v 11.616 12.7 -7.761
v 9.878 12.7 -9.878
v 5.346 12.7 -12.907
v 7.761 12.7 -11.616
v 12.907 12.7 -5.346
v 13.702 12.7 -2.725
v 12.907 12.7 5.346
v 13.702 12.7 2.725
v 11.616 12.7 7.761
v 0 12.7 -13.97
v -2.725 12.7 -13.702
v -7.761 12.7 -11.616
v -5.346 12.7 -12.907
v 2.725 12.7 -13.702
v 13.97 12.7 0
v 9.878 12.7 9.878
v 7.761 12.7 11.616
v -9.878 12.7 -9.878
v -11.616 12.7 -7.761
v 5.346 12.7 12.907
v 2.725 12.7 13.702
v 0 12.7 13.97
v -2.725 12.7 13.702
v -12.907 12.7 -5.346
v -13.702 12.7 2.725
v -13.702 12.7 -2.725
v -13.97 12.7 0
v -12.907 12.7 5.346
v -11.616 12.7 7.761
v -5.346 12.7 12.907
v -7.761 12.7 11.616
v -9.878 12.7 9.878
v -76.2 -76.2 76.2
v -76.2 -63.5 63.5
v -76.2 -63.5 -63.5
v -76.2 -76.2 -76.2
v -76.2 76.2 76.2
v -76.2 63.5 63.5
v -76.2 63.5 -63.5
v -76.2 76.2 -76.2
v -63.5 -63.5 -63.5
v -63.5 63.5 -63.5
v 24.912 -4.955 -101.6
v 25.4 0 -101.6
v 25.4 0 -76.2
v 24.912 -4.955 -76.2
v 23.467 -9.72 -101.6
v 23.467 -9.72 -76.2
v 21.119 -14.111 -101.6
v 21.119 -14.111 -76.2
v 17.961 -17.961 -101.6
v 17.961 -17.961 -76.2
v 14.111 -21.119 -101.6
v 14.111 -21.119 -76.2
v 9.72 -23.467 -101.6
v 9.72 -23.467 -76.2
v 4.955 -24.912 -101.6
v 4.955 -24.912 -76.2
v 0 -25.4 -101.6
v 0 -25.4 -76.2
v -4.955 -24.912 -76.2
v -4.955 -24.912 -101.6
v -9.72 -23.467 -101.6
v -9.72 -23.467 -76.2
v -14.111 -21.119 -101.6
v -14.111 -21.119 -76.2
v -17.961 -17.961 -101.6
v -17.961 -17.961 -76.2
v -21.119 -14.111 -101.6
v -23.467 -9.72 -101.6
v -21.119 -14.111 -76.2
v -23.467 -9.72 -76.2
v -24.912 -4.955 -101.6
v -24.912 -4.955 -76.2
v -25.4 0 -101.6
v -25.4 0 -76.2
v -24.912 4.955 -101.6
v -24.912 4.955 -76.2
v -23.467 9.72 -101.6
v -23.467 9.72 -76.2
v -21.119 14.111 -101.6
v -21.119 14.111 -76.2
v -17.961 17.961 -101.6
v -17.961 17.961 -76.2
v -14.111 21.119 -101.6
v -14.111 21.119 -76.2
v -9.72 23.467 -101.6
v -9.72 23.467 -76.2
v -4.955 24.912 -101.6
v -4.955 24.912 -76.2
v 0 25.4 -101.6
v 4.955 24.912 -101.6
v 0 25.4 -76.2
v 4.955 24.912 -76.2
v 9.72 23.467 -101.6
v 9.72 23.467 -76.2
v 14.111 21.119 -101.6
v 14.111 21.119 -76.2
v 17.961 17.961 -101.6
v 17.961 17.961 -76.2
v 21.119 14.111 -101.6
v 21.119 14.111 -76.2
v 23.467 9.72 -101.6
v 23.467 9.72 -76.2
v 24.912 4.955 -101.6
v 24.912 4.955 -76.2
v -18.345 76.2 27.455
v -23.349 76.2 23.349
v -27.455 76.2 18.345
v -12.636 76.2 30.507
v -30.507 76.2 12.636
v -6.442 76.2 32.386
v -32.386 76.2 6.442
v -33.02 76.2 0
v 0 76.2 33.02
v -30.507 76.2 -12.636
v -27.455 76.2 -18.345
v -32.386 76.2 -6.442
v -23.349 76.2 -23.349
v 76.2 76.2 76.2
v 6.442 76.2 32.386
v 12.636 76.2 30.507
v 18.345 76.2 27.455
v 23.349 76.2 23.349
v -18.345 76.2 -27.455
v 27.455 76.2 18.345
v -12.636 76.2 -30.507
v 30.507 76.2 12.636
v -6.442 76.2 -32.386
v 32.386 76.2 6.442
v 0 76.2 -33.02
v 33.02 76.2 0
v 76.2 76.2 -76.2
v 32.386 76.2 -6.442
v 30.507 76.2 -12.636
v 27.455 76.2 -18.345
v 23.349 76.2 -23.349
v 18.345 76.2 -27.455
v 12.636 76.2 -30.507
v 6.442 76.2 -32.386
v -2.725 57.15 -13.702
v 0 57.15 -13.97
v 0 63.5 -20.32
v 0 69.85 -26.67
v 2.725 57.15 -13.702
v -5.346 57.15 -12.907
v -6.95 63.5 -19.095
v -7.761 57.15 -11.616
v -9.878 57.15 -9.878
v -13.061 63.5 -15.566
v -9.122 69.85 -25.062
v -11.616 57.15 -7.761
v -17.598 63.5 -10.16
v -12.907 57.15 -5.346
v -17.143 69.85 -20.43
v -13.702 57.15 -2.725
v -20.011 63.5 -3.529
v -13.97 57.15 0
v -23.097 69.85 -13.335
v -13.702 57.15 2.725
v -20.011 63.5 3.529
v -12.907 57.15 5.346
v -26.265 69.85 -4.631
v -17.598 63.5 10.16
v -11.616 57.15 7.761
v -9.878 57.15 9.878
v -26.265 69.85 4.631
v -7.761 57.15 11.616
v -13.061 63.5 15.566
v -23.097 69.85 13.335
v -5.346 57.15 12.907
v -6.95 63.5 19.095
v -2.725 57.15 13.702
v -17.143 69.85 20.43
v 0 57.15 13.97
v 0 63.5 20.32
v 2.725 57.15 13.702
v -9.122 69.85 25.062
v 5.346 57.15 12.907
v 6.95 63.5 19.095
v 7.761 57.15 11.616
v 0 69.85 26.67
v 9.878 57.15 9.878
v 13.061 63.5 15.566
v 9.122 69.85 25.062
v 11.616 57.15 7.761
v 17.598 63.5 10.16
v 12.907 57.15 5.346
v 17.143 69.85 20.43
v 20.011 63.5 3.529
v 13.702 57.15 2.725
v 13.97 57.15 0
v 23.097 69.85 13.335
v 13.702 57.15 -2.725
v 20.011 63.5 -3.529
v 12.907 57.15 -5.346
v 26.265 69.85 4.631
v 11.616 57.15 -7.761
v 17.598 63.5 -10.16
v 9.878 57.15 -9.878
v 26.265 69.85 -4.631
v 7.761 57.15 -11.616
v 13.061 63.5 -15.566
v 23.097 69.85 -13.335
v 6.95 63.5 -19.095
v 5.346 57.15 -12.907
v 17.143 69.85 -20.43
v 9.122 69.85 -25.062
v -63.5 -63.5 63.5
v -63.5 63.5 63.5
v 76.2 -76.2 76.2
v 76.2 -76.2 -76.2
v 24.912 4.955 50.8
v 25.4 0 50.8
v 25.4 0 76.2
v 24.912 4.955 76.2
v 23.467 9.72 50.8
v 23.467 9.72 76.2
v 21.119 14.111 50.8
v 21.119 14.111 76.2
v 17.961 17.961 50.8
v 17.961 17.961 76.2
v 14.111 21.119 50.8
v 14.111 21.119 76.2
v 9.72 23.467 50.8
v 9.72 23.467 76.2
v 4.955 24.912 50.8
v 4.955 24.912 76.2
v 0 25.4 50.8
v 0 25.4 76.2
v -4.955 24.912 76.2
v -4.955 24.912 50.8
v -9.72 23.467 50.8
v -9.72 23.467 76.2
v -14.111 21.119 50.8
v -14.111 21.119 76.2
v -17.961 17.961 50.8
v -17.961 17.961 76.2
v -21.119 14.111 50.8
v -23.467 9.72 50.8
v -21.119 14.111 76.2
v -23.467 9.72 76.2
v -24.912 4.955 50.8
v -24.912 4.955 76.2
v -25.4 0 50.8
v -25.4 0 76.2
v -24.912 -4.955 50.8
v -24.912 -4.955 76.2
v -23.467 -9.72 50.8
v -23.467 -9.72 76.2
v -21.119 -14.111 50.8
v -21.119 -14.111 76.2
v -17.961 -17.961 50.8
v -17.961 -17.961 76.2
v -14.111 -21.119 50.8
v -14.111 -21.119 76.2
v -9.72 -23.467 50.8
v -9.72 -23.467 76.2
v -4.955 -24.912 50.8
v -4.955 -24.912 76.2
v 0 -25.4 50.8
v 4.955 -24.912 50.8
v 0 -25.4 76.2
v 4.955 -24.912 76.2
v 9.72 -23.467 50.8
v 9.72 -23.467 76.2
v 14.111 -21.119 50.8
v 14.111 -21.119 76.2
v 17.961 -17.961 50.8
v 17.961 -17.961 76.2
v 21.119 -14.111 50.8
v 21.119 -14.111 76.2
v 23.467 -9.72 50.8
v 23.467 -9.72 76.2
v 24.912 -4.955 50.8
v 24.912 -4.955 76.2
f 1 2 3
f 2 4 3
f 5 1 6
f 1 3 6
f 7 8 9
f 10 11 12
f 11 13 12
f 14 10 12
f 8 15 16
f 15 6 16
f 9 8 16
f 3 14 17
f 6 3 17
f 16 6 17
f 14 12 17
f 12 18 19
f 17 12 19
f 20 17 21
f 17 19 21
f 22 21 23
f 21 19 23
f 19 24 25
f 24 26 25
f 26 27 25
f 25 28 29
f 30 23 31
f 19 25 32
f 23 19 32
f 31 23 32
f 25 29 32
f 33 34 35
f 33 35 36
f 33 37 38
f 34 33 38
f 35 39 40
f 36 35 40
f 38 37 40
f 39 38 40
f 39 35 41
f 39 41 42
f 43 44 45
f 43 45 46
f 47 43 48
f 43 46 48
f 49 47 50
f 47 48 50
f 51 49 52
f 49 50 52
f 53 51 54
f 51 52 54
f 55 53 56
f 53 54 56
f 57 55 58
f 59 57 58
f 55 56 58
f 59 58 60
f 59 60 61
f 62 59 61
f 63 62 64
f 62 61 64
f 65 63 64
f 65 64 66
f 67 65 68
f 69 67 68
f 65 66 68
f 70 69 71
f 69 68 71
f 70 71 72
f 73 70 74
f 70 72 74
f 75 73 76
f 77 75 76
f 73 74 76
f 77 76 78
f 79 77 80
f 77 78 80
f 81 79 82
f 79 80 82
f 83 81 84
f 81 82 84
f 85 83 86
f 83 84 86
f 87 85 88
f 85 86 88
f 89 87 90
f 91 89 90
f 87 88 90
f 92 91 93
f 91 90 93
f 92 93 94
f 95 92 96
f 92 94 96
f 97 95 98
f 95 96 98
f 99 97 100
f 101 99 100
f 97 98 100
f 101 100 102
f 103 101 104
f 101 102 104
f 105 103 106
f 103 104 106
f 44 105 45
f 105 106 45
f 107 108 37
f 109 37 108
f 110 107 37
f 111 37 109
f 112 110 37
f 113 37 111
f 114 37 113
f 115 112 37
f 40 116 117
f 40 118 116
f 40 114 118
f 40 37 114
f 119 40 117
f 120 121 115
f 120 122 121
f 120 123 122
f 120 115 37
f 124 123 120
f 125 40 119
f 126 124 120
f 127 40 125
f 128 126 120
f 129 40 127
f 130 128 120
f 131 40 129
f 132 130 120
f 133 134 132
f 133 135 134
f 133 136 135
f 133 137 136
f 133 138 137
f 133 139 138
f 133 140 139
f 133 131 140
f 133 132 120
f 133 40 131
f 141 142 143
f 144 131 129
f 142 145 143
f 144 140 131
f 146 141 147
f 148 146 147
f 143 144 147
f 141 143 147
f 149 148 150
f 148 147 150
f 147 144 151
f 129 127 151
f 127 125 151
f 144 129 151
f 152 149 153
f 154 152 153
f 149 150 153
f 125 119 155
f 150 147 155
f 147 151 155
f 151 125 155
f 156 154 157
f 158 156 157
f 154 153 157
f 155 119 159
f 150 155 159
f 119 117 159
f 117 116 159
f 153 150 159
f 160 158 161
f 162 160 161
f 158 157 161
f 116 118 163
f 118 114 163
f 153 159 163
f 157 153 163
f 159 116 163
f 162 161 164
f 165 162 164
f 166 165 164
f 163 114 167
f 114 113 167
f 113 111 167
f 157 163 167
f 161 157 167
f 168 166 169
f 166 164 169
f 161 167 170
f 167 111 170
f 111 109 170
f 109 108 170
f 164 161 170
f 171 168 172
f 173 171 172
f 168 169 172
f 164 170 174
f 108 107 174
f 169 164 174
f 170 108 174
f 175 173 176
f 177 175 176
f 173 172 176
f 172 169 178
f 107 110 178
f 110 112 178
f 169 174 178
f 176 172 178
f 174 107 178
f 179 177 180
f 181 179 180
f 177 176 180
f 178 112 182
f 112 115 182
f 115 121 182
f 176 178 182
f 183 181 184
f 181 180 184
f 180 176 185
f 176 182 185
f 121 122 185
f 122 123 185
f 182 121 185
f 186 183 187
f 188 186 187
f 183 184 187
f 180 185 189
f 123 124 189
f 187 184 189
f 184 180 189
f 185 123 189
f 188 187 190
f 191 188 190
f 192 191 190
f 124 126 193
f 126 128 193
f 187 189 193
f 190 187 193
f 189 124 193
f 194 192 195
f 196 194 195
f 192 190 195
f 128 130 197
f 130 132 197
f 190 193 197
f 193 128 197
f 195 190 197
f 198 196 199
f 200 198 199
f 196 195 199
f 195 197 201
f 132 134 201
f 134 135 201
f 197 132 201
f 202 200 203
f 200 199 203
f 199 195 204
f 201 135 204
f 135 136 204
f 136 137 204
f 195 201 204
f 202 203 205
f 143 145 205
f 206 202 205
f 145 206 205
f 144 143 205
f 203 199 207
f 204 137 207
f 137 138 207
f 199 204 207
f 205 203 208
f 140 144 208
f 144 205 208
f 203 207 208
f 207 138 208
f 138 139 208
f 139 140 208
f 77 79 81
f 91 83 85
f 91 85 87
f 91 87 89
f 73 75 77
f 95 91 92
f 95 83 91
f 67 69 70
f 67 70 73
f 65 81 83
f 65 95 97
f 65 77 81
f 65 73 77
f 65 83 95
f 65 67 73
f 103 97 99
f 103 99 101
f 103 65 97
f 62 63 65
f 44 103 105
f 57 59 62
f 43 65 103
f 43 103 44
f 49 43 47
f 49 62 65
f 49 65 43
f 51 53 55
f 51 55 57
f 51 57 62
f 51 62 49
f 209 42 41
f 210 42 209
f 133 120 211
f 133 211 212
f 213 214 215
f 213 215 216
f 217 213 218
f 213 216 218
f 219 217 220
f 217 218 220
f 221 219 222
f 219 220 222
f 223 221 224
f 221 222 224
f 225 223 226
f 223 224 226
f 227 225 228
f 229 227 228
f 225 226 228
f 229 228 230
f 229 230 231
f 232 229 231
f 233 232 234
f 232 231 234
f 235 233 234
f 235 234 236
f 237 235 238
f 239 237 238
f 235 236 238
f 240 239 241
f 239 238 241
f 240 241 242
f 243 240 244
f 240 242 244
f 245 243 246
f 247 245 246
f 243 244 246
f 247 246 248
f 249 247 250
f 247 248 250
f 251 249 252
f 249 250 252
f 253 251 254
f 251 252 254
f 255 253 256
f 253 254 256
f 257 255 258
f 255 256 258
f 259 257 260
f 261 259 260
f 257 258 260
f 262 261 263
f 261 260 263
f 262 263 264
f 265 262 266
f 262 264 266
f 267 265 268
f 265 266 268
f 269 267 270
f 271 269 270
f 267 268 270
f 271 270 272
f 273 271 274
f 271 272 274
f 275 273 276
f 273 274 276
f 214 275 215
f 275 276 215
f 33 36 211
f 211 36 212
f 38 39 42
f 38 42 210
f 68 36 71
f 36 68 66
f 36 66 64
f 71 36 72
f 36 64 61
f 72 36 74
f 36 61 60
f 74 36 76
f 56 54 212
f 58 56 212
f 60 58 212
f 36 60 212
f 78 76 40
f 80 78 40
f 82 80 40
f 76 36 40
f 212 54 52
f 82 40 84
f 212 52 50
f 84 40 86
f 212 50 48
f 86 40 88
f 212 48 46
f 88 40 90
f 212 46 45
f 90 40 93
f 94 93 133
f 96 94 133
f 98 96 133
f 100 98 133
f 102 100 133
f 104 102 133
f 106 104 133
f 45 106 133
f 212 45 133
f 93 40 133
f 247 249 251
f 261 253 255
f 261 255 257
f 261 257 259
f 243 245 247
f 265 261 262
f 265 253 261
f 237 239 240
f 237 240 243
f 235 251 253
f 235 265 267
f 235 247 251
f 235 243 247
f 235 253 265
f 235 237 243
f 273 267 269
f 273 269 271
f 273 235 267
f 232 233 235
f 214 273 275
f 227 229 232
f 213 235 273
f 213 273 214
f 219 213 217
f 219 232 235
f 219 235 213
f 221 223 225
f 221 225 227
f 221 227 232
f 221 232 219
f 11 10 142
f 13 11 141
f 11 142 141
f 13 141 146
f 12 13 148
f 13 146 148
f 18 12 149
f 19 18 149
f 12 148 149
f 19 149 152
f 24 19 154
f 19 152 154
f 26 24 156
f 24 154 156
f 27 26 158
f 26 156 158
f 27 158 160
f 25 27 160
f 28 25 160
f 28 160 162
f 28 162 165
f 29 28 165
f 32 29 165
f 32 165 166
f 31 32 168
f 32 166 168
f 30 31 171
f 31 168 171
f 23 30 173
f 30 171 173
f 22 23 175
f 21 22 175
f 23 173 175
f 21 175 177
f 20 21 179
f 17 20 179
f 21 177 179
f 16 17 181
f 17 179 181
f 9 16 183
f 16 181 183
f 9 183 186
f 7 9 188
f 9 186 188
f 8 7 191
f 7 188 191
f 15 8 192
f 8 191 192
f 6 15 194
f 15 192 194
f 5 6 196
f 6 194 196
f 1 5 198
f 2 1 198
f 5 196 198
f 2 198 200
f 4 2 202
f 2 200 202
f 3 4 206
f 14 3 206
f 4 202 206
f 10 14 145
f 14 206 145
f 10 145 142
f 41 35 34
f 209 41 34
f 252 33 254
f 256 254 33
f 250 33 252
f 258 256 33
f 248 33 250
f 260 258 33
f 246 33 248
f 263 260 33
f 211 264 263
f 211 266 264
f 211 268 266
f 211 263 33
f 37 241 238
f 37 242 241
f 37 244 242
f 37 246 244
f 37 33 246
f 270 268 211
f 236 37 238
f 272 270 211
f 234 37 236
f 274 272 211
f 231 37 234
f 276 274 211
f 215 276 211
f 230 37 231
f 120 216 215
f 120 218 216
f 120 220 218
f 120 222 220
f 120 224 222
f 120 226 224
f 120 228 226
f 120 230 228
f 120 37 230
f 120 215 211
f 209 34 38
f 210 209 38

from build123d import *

# Parameters (mm, degrees)
SKETCH1_W           = 152.4
SKETCH1_H           = 152.4
BOSS_EXTRUDE1_DEPTH = 76.2
SKETCH4_R           = 25.4
CUT_EXTRUDE2_DEPTH  = 25.4
SKETCH5_R           = 25.4
BOSS_EXTRUDE2_DEPTH = 25.4
SKETCH6_W           = 127
SKETCH6_H           = 127
CUT_EXTRUDE3_DEPTH  = 12.7


with BuildPart() as part:
    # Sketch1 → Boss-Extrude1 (new, symmetric)
    with BuildSketch(Plane(origin=(0, 0, 0), x_dir=(1, 0, 0), z_dir=(0, 1, 0))):
        Rectangle(SKETCH1_W, SKETCH1_H)
    extrude(amount=BOSS_EXTRUDE1_DEPTH, both=True)

    # Sketch2 → Cut-Revolve1 (revolve, cut)
    with BuildSketch(Plane.XY, mode=Mode.PRIVATE) as cut_revolve1_sk:
        Polygon((0, 12.7), (13.97, 12.7), (13.97, 57.15), (33.02, 76.2), (0, 76.2), align=None)
    revolve(cut_revolve1_sk.sketch.rotate(Axis((0, 0, 0), (0, 1, 0)), 90), axis=Axis((0, 0, 0), (0, 1, 0)), mode=Mode.SUBTRACT)

    # Sketch4 → Cut-Extrude2 (cut)
    with BuildSketch(Plane.XY.offset(76.2)):
        Circle(SKETCH4_R)
    extrude(amount=-CUT_EXTRUDE2_DEPTH, mode=Mode.SUBTRACT)

    # Sketch5 → Boss-Extrude2 (add)
    with BuildSketch(Plane(origin=(0, 0, -76.2), x_dir=(-1, 0, 0), z_dir=(0, 0, -1))):
        with Locations(Location((0, 0, 0), (0, 0, 180))):
            Circle(SKETCH5_R)
    extrude(amount=BOSS_EXTRUDE2_DEPTH)

    # Sketch6 → Cut-Extrude3 (cut)
    with BuildSketch(Plane.ZY.offset(76.2)):
        Rectangle(SKETCH6_W, SKETCH6_H)
    extrude(amount=-CUT_EXTRUDE3_DEPTH, mode=Mode.SUBTRACT)


solid = part.part
